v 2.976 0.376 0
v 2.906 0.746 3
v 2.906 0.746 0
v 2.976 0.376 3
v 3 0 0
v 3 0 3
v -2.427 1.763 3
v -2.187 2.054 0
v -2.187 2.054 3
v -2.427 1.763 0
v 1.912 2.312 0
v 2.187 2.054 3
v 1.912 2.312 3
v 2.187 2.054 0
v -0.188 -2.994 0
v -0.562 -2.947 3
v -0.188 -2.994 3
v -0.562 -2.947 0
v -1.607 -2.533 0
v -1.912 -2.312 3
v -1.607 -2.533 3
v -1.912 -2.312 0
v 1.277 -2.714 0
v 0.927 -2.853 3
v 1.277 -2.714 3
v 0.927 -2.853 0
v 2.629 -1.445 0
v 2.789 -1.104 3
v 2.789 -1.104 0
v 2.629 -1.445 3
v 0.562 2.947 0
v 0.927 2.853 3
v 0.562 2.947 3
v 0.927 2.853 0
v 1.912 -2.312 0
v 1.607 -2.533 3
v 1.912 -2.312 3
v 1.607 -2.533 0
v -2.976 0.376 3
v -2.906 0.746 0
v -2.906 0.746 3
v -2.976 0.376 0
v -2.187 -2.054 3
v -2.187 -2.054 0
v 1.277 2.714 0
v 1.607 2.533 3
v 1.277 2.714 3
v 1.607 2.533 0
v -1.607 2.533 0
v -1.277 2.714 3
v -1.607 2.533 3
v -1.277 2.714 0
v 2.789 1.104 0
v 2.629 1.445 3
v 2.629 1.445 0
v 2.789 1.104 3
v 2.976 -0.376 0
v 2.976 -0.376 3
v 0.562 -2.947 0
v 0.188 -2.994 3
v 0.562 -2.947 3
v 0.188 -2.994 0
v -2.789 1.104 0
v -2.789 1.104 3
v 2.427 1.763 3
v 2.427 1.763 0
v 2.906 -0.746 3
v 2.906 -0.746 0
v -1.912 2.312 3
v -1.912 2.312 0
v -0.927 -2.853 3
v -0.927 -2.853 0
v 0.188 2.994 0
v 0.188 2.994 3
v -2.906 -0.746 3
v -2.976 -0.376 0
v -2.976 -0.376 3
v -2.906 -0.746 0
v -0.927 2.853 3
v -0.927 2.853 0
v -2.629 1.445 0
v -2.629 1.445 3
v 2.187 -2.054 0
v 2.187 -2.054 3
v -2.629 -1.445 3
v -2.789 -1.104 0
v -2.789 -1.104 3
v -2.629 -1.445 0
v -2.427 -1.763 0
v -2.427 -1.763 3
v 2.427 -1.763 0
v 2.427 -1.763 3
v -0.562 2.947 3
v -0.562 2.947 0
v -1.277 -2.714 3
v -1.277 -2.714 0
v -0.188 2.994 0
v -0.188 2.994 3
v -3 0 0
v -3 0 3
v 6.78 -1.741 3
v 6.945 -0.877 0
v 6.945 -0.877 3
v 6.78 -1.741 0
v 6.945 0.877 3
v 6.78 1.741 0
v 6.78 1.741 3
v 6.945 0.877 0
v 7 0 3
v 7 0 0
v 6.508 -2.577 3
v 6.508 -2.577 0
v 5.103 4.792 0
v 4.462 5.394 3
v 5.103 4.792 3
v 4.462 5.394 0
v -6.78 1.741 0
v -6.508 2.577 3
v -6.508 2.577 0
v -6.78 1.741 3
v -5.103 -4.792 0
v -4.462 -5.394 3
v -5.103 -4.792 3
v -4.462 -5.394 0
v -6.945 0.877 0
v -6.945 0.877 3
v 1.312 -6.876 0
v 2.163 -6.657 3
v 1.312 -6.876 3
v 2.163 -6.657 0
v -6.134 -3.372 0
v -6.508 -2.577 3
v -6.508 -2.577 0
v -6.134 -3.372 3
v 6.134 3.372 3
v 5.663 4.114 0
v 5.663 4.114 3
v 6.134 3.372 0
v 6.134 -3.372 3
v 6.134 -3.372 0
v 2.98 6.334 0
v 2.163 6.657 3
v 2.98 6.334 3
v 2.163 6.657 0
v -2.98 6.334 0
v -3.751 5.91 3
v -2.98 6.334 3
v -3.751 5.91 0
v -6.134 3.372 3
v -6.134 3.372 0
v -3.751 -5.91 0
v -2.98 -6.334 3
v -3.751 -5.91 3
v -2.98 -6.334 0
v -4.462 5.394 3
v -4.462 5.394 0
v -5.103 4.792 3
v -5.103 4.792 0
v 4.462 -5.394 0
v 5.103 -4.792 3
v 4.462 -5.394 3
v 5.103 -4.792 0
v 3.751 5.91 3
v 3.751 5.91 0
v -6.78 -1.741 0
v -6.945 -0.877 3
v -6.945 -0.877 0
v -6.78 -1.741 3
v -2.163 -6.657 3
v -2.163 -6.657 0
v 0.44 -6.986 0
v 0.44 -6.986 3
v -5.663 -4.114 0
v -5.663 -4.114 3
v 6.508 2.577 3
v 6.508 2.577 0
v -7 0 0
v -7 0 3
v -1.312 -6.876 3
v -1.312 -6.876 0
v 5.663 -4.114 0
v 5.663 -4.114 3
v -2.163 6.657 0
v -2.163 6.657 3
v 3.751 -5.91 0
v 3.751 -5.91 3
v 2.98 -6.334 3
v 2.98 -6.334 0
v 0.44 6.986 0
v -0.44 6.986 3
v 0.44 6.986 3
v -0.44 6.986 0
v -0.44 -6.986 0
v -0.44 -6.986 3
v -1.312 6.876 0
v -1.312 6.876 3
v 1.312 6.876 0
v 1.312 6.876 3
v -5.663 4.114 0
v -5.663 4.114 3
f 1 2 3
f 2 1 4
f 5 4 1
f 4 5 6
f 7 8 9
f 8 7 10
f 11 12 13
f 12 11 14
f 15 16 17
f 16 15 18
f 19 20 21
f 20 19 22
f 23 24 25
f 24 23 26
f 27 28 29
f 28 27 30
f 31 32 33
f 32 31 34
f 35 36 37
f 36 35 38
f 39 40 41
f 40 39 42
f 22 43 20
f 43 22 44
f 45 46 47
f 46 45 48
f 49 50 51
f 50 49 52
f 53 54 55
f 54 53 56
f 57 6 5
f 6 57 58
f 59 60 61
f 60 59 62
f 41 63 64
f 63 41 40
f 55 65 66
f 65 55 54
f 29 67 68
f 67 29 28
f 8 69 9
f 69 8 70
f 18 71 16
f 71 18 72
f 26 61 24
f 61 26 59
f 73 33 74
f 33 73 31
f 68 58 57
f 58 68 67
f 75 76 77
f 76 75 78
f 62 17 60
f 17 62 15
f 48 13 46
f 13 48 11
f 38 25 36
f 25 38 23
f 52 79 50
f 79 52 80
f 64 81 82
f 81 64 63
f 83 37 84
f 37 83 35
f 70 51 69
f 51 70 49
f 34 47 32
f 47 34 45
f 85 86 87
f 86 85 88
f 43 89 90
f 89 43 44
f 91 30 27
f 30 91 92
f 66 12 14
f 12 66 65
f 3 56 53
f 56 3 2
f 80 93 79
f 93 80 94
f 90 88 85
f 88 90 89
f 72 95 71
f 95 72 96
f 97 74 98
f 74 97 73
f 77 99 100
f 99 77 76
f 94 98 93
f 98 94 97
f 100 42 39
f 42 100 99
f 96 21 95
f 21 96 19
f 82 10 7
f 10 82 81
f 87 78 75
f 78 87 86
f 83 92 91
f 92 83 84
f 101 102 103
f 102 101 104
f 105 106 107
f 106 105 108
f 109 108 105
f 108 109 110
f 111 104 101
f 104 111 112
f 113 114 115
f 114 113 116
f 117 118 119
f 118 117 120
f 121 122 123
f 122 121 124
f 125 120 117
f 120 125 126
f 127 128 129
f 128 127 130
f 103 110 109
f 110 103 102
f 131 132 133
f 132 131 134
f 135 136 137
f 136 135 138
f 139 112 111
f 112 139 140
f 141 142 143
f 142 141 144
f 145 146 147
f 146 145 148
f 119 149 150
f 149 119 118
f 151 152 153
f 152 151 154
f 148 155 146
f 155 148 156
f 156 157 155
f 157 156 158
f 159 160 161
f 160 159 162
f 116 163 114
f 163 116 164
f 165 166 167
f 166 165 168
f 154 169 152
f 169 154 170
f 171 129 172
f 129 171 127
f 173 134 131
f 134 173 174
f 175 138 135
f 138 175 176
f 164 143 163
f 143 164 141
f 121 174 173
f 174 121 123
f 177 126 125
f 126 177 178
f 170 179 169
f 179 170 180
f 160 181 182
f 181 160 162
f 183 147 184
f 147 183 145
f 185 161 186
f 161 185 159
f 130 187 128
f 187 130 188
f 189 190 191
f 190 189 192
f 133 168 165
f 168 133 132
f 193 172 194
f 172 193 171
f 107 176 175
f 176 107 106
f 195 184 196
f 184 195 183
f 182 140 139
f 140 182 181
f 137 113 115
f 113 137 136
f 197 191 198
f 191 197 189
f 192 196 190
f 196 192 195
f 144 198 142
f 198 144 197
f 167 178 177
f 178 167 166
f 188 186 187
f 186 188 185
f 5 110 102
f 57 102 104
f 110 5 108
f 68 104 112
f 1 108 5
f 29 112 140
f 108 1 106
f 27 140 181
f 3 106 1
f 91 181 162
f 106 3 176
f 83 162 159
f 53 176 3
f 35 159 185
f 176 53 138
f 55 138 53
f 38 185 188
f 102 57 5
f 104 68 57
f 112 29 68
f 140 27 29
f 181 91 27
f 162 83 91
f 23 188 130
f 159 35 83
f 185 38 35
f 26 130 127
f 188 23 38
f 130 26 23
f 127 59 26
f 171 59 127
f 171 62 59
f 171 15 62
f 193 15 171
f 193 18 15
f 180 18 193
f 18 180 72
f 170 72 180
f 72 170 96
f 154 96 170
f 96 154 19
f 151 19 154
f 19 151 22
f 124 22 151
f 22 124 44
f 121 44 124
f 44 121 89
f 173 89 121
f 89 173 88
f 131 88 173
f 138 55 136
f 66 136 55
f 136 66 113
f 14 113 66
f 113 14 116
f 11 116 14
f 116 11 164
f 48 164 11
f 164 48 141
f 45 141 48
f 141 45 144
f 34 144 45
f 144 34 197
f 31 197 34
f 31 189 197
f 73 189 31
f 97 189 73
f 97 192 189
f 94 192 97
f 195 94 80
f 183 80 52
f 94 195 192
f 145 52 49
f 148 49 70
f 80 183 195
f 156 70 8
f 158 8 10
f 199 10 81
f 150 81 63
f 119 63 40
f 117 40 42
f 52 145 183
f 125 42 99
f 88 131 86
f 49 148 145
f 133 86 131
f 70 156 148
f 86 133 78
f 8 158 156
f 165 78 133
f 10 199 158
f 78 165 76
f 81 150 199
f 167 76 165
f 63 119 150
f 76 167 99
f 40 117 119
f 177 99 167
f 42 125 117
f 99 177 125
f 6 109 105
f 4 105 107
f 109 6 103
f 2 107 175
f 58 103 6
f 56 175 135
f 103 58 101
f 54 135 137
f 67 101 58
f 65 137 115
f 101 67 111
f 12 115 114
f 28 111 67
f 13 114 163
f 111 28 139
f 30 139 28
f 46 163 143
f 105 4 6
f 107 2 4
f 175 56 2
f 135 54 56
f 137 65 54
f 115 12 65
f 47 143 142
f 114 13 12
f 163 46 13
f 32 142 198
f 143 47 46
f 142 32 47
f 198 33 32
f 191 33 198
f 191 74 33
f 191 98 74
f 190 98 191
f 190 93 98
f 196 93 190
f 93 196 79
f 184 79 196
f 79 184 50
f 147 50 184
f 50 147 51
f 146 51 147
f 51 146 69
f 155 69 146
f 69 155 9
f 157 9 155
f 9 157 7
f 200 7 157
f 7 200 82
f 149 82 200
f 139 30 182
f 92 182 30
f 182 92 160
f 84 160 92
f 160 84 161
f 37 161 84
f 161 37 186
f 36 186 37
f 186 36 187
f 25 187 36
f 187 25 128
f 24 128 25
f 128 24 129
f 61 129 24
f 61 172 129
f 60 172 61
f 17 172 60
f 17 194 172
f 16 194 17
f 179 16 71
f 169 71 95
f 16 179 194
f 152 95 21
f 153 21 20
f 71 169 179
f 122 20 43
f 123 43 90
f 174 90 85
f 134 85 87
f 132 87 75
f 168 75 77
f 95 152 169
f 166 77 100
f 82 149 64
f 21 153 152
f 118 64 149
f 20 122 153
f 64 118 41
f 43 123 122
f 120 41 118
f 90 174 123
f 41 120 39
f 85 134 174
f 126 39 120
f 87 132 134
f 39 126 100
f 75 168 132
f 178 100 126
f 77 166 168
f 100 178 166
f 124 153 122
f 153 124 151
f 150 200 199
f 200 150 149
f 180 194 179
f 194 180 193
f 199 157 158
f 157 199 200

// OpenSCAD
$fn = 50;


difference() {
	union() {
		cylinder(h = 3, r = 7.0000000000);
	}
	union() {
		#translate(v = [0.0000000000, 0.0000000000, -100.0000000000]) {
			cylinder(h = 200, r = 3.0000000000);
		}
		#translate(v = [0.0000000000, 0.0000000000, -100.0000000000]) {
			cylinder(h = 200, r = 3.0000000000);
		}
		#translate(v = [0.0000000000, 0.0000000000, -100.0000000000]) {
			cylinder(h = 200, r = 3.0000000000);
		}
		#translate(v = [0.0000000000, 0.0000000000, -100.0000000000]) {
			cylinder(h = 200, r = 3.0000000000);
		}
		#cylinder(h = 3, r = 3.0000000000);
	}
}
